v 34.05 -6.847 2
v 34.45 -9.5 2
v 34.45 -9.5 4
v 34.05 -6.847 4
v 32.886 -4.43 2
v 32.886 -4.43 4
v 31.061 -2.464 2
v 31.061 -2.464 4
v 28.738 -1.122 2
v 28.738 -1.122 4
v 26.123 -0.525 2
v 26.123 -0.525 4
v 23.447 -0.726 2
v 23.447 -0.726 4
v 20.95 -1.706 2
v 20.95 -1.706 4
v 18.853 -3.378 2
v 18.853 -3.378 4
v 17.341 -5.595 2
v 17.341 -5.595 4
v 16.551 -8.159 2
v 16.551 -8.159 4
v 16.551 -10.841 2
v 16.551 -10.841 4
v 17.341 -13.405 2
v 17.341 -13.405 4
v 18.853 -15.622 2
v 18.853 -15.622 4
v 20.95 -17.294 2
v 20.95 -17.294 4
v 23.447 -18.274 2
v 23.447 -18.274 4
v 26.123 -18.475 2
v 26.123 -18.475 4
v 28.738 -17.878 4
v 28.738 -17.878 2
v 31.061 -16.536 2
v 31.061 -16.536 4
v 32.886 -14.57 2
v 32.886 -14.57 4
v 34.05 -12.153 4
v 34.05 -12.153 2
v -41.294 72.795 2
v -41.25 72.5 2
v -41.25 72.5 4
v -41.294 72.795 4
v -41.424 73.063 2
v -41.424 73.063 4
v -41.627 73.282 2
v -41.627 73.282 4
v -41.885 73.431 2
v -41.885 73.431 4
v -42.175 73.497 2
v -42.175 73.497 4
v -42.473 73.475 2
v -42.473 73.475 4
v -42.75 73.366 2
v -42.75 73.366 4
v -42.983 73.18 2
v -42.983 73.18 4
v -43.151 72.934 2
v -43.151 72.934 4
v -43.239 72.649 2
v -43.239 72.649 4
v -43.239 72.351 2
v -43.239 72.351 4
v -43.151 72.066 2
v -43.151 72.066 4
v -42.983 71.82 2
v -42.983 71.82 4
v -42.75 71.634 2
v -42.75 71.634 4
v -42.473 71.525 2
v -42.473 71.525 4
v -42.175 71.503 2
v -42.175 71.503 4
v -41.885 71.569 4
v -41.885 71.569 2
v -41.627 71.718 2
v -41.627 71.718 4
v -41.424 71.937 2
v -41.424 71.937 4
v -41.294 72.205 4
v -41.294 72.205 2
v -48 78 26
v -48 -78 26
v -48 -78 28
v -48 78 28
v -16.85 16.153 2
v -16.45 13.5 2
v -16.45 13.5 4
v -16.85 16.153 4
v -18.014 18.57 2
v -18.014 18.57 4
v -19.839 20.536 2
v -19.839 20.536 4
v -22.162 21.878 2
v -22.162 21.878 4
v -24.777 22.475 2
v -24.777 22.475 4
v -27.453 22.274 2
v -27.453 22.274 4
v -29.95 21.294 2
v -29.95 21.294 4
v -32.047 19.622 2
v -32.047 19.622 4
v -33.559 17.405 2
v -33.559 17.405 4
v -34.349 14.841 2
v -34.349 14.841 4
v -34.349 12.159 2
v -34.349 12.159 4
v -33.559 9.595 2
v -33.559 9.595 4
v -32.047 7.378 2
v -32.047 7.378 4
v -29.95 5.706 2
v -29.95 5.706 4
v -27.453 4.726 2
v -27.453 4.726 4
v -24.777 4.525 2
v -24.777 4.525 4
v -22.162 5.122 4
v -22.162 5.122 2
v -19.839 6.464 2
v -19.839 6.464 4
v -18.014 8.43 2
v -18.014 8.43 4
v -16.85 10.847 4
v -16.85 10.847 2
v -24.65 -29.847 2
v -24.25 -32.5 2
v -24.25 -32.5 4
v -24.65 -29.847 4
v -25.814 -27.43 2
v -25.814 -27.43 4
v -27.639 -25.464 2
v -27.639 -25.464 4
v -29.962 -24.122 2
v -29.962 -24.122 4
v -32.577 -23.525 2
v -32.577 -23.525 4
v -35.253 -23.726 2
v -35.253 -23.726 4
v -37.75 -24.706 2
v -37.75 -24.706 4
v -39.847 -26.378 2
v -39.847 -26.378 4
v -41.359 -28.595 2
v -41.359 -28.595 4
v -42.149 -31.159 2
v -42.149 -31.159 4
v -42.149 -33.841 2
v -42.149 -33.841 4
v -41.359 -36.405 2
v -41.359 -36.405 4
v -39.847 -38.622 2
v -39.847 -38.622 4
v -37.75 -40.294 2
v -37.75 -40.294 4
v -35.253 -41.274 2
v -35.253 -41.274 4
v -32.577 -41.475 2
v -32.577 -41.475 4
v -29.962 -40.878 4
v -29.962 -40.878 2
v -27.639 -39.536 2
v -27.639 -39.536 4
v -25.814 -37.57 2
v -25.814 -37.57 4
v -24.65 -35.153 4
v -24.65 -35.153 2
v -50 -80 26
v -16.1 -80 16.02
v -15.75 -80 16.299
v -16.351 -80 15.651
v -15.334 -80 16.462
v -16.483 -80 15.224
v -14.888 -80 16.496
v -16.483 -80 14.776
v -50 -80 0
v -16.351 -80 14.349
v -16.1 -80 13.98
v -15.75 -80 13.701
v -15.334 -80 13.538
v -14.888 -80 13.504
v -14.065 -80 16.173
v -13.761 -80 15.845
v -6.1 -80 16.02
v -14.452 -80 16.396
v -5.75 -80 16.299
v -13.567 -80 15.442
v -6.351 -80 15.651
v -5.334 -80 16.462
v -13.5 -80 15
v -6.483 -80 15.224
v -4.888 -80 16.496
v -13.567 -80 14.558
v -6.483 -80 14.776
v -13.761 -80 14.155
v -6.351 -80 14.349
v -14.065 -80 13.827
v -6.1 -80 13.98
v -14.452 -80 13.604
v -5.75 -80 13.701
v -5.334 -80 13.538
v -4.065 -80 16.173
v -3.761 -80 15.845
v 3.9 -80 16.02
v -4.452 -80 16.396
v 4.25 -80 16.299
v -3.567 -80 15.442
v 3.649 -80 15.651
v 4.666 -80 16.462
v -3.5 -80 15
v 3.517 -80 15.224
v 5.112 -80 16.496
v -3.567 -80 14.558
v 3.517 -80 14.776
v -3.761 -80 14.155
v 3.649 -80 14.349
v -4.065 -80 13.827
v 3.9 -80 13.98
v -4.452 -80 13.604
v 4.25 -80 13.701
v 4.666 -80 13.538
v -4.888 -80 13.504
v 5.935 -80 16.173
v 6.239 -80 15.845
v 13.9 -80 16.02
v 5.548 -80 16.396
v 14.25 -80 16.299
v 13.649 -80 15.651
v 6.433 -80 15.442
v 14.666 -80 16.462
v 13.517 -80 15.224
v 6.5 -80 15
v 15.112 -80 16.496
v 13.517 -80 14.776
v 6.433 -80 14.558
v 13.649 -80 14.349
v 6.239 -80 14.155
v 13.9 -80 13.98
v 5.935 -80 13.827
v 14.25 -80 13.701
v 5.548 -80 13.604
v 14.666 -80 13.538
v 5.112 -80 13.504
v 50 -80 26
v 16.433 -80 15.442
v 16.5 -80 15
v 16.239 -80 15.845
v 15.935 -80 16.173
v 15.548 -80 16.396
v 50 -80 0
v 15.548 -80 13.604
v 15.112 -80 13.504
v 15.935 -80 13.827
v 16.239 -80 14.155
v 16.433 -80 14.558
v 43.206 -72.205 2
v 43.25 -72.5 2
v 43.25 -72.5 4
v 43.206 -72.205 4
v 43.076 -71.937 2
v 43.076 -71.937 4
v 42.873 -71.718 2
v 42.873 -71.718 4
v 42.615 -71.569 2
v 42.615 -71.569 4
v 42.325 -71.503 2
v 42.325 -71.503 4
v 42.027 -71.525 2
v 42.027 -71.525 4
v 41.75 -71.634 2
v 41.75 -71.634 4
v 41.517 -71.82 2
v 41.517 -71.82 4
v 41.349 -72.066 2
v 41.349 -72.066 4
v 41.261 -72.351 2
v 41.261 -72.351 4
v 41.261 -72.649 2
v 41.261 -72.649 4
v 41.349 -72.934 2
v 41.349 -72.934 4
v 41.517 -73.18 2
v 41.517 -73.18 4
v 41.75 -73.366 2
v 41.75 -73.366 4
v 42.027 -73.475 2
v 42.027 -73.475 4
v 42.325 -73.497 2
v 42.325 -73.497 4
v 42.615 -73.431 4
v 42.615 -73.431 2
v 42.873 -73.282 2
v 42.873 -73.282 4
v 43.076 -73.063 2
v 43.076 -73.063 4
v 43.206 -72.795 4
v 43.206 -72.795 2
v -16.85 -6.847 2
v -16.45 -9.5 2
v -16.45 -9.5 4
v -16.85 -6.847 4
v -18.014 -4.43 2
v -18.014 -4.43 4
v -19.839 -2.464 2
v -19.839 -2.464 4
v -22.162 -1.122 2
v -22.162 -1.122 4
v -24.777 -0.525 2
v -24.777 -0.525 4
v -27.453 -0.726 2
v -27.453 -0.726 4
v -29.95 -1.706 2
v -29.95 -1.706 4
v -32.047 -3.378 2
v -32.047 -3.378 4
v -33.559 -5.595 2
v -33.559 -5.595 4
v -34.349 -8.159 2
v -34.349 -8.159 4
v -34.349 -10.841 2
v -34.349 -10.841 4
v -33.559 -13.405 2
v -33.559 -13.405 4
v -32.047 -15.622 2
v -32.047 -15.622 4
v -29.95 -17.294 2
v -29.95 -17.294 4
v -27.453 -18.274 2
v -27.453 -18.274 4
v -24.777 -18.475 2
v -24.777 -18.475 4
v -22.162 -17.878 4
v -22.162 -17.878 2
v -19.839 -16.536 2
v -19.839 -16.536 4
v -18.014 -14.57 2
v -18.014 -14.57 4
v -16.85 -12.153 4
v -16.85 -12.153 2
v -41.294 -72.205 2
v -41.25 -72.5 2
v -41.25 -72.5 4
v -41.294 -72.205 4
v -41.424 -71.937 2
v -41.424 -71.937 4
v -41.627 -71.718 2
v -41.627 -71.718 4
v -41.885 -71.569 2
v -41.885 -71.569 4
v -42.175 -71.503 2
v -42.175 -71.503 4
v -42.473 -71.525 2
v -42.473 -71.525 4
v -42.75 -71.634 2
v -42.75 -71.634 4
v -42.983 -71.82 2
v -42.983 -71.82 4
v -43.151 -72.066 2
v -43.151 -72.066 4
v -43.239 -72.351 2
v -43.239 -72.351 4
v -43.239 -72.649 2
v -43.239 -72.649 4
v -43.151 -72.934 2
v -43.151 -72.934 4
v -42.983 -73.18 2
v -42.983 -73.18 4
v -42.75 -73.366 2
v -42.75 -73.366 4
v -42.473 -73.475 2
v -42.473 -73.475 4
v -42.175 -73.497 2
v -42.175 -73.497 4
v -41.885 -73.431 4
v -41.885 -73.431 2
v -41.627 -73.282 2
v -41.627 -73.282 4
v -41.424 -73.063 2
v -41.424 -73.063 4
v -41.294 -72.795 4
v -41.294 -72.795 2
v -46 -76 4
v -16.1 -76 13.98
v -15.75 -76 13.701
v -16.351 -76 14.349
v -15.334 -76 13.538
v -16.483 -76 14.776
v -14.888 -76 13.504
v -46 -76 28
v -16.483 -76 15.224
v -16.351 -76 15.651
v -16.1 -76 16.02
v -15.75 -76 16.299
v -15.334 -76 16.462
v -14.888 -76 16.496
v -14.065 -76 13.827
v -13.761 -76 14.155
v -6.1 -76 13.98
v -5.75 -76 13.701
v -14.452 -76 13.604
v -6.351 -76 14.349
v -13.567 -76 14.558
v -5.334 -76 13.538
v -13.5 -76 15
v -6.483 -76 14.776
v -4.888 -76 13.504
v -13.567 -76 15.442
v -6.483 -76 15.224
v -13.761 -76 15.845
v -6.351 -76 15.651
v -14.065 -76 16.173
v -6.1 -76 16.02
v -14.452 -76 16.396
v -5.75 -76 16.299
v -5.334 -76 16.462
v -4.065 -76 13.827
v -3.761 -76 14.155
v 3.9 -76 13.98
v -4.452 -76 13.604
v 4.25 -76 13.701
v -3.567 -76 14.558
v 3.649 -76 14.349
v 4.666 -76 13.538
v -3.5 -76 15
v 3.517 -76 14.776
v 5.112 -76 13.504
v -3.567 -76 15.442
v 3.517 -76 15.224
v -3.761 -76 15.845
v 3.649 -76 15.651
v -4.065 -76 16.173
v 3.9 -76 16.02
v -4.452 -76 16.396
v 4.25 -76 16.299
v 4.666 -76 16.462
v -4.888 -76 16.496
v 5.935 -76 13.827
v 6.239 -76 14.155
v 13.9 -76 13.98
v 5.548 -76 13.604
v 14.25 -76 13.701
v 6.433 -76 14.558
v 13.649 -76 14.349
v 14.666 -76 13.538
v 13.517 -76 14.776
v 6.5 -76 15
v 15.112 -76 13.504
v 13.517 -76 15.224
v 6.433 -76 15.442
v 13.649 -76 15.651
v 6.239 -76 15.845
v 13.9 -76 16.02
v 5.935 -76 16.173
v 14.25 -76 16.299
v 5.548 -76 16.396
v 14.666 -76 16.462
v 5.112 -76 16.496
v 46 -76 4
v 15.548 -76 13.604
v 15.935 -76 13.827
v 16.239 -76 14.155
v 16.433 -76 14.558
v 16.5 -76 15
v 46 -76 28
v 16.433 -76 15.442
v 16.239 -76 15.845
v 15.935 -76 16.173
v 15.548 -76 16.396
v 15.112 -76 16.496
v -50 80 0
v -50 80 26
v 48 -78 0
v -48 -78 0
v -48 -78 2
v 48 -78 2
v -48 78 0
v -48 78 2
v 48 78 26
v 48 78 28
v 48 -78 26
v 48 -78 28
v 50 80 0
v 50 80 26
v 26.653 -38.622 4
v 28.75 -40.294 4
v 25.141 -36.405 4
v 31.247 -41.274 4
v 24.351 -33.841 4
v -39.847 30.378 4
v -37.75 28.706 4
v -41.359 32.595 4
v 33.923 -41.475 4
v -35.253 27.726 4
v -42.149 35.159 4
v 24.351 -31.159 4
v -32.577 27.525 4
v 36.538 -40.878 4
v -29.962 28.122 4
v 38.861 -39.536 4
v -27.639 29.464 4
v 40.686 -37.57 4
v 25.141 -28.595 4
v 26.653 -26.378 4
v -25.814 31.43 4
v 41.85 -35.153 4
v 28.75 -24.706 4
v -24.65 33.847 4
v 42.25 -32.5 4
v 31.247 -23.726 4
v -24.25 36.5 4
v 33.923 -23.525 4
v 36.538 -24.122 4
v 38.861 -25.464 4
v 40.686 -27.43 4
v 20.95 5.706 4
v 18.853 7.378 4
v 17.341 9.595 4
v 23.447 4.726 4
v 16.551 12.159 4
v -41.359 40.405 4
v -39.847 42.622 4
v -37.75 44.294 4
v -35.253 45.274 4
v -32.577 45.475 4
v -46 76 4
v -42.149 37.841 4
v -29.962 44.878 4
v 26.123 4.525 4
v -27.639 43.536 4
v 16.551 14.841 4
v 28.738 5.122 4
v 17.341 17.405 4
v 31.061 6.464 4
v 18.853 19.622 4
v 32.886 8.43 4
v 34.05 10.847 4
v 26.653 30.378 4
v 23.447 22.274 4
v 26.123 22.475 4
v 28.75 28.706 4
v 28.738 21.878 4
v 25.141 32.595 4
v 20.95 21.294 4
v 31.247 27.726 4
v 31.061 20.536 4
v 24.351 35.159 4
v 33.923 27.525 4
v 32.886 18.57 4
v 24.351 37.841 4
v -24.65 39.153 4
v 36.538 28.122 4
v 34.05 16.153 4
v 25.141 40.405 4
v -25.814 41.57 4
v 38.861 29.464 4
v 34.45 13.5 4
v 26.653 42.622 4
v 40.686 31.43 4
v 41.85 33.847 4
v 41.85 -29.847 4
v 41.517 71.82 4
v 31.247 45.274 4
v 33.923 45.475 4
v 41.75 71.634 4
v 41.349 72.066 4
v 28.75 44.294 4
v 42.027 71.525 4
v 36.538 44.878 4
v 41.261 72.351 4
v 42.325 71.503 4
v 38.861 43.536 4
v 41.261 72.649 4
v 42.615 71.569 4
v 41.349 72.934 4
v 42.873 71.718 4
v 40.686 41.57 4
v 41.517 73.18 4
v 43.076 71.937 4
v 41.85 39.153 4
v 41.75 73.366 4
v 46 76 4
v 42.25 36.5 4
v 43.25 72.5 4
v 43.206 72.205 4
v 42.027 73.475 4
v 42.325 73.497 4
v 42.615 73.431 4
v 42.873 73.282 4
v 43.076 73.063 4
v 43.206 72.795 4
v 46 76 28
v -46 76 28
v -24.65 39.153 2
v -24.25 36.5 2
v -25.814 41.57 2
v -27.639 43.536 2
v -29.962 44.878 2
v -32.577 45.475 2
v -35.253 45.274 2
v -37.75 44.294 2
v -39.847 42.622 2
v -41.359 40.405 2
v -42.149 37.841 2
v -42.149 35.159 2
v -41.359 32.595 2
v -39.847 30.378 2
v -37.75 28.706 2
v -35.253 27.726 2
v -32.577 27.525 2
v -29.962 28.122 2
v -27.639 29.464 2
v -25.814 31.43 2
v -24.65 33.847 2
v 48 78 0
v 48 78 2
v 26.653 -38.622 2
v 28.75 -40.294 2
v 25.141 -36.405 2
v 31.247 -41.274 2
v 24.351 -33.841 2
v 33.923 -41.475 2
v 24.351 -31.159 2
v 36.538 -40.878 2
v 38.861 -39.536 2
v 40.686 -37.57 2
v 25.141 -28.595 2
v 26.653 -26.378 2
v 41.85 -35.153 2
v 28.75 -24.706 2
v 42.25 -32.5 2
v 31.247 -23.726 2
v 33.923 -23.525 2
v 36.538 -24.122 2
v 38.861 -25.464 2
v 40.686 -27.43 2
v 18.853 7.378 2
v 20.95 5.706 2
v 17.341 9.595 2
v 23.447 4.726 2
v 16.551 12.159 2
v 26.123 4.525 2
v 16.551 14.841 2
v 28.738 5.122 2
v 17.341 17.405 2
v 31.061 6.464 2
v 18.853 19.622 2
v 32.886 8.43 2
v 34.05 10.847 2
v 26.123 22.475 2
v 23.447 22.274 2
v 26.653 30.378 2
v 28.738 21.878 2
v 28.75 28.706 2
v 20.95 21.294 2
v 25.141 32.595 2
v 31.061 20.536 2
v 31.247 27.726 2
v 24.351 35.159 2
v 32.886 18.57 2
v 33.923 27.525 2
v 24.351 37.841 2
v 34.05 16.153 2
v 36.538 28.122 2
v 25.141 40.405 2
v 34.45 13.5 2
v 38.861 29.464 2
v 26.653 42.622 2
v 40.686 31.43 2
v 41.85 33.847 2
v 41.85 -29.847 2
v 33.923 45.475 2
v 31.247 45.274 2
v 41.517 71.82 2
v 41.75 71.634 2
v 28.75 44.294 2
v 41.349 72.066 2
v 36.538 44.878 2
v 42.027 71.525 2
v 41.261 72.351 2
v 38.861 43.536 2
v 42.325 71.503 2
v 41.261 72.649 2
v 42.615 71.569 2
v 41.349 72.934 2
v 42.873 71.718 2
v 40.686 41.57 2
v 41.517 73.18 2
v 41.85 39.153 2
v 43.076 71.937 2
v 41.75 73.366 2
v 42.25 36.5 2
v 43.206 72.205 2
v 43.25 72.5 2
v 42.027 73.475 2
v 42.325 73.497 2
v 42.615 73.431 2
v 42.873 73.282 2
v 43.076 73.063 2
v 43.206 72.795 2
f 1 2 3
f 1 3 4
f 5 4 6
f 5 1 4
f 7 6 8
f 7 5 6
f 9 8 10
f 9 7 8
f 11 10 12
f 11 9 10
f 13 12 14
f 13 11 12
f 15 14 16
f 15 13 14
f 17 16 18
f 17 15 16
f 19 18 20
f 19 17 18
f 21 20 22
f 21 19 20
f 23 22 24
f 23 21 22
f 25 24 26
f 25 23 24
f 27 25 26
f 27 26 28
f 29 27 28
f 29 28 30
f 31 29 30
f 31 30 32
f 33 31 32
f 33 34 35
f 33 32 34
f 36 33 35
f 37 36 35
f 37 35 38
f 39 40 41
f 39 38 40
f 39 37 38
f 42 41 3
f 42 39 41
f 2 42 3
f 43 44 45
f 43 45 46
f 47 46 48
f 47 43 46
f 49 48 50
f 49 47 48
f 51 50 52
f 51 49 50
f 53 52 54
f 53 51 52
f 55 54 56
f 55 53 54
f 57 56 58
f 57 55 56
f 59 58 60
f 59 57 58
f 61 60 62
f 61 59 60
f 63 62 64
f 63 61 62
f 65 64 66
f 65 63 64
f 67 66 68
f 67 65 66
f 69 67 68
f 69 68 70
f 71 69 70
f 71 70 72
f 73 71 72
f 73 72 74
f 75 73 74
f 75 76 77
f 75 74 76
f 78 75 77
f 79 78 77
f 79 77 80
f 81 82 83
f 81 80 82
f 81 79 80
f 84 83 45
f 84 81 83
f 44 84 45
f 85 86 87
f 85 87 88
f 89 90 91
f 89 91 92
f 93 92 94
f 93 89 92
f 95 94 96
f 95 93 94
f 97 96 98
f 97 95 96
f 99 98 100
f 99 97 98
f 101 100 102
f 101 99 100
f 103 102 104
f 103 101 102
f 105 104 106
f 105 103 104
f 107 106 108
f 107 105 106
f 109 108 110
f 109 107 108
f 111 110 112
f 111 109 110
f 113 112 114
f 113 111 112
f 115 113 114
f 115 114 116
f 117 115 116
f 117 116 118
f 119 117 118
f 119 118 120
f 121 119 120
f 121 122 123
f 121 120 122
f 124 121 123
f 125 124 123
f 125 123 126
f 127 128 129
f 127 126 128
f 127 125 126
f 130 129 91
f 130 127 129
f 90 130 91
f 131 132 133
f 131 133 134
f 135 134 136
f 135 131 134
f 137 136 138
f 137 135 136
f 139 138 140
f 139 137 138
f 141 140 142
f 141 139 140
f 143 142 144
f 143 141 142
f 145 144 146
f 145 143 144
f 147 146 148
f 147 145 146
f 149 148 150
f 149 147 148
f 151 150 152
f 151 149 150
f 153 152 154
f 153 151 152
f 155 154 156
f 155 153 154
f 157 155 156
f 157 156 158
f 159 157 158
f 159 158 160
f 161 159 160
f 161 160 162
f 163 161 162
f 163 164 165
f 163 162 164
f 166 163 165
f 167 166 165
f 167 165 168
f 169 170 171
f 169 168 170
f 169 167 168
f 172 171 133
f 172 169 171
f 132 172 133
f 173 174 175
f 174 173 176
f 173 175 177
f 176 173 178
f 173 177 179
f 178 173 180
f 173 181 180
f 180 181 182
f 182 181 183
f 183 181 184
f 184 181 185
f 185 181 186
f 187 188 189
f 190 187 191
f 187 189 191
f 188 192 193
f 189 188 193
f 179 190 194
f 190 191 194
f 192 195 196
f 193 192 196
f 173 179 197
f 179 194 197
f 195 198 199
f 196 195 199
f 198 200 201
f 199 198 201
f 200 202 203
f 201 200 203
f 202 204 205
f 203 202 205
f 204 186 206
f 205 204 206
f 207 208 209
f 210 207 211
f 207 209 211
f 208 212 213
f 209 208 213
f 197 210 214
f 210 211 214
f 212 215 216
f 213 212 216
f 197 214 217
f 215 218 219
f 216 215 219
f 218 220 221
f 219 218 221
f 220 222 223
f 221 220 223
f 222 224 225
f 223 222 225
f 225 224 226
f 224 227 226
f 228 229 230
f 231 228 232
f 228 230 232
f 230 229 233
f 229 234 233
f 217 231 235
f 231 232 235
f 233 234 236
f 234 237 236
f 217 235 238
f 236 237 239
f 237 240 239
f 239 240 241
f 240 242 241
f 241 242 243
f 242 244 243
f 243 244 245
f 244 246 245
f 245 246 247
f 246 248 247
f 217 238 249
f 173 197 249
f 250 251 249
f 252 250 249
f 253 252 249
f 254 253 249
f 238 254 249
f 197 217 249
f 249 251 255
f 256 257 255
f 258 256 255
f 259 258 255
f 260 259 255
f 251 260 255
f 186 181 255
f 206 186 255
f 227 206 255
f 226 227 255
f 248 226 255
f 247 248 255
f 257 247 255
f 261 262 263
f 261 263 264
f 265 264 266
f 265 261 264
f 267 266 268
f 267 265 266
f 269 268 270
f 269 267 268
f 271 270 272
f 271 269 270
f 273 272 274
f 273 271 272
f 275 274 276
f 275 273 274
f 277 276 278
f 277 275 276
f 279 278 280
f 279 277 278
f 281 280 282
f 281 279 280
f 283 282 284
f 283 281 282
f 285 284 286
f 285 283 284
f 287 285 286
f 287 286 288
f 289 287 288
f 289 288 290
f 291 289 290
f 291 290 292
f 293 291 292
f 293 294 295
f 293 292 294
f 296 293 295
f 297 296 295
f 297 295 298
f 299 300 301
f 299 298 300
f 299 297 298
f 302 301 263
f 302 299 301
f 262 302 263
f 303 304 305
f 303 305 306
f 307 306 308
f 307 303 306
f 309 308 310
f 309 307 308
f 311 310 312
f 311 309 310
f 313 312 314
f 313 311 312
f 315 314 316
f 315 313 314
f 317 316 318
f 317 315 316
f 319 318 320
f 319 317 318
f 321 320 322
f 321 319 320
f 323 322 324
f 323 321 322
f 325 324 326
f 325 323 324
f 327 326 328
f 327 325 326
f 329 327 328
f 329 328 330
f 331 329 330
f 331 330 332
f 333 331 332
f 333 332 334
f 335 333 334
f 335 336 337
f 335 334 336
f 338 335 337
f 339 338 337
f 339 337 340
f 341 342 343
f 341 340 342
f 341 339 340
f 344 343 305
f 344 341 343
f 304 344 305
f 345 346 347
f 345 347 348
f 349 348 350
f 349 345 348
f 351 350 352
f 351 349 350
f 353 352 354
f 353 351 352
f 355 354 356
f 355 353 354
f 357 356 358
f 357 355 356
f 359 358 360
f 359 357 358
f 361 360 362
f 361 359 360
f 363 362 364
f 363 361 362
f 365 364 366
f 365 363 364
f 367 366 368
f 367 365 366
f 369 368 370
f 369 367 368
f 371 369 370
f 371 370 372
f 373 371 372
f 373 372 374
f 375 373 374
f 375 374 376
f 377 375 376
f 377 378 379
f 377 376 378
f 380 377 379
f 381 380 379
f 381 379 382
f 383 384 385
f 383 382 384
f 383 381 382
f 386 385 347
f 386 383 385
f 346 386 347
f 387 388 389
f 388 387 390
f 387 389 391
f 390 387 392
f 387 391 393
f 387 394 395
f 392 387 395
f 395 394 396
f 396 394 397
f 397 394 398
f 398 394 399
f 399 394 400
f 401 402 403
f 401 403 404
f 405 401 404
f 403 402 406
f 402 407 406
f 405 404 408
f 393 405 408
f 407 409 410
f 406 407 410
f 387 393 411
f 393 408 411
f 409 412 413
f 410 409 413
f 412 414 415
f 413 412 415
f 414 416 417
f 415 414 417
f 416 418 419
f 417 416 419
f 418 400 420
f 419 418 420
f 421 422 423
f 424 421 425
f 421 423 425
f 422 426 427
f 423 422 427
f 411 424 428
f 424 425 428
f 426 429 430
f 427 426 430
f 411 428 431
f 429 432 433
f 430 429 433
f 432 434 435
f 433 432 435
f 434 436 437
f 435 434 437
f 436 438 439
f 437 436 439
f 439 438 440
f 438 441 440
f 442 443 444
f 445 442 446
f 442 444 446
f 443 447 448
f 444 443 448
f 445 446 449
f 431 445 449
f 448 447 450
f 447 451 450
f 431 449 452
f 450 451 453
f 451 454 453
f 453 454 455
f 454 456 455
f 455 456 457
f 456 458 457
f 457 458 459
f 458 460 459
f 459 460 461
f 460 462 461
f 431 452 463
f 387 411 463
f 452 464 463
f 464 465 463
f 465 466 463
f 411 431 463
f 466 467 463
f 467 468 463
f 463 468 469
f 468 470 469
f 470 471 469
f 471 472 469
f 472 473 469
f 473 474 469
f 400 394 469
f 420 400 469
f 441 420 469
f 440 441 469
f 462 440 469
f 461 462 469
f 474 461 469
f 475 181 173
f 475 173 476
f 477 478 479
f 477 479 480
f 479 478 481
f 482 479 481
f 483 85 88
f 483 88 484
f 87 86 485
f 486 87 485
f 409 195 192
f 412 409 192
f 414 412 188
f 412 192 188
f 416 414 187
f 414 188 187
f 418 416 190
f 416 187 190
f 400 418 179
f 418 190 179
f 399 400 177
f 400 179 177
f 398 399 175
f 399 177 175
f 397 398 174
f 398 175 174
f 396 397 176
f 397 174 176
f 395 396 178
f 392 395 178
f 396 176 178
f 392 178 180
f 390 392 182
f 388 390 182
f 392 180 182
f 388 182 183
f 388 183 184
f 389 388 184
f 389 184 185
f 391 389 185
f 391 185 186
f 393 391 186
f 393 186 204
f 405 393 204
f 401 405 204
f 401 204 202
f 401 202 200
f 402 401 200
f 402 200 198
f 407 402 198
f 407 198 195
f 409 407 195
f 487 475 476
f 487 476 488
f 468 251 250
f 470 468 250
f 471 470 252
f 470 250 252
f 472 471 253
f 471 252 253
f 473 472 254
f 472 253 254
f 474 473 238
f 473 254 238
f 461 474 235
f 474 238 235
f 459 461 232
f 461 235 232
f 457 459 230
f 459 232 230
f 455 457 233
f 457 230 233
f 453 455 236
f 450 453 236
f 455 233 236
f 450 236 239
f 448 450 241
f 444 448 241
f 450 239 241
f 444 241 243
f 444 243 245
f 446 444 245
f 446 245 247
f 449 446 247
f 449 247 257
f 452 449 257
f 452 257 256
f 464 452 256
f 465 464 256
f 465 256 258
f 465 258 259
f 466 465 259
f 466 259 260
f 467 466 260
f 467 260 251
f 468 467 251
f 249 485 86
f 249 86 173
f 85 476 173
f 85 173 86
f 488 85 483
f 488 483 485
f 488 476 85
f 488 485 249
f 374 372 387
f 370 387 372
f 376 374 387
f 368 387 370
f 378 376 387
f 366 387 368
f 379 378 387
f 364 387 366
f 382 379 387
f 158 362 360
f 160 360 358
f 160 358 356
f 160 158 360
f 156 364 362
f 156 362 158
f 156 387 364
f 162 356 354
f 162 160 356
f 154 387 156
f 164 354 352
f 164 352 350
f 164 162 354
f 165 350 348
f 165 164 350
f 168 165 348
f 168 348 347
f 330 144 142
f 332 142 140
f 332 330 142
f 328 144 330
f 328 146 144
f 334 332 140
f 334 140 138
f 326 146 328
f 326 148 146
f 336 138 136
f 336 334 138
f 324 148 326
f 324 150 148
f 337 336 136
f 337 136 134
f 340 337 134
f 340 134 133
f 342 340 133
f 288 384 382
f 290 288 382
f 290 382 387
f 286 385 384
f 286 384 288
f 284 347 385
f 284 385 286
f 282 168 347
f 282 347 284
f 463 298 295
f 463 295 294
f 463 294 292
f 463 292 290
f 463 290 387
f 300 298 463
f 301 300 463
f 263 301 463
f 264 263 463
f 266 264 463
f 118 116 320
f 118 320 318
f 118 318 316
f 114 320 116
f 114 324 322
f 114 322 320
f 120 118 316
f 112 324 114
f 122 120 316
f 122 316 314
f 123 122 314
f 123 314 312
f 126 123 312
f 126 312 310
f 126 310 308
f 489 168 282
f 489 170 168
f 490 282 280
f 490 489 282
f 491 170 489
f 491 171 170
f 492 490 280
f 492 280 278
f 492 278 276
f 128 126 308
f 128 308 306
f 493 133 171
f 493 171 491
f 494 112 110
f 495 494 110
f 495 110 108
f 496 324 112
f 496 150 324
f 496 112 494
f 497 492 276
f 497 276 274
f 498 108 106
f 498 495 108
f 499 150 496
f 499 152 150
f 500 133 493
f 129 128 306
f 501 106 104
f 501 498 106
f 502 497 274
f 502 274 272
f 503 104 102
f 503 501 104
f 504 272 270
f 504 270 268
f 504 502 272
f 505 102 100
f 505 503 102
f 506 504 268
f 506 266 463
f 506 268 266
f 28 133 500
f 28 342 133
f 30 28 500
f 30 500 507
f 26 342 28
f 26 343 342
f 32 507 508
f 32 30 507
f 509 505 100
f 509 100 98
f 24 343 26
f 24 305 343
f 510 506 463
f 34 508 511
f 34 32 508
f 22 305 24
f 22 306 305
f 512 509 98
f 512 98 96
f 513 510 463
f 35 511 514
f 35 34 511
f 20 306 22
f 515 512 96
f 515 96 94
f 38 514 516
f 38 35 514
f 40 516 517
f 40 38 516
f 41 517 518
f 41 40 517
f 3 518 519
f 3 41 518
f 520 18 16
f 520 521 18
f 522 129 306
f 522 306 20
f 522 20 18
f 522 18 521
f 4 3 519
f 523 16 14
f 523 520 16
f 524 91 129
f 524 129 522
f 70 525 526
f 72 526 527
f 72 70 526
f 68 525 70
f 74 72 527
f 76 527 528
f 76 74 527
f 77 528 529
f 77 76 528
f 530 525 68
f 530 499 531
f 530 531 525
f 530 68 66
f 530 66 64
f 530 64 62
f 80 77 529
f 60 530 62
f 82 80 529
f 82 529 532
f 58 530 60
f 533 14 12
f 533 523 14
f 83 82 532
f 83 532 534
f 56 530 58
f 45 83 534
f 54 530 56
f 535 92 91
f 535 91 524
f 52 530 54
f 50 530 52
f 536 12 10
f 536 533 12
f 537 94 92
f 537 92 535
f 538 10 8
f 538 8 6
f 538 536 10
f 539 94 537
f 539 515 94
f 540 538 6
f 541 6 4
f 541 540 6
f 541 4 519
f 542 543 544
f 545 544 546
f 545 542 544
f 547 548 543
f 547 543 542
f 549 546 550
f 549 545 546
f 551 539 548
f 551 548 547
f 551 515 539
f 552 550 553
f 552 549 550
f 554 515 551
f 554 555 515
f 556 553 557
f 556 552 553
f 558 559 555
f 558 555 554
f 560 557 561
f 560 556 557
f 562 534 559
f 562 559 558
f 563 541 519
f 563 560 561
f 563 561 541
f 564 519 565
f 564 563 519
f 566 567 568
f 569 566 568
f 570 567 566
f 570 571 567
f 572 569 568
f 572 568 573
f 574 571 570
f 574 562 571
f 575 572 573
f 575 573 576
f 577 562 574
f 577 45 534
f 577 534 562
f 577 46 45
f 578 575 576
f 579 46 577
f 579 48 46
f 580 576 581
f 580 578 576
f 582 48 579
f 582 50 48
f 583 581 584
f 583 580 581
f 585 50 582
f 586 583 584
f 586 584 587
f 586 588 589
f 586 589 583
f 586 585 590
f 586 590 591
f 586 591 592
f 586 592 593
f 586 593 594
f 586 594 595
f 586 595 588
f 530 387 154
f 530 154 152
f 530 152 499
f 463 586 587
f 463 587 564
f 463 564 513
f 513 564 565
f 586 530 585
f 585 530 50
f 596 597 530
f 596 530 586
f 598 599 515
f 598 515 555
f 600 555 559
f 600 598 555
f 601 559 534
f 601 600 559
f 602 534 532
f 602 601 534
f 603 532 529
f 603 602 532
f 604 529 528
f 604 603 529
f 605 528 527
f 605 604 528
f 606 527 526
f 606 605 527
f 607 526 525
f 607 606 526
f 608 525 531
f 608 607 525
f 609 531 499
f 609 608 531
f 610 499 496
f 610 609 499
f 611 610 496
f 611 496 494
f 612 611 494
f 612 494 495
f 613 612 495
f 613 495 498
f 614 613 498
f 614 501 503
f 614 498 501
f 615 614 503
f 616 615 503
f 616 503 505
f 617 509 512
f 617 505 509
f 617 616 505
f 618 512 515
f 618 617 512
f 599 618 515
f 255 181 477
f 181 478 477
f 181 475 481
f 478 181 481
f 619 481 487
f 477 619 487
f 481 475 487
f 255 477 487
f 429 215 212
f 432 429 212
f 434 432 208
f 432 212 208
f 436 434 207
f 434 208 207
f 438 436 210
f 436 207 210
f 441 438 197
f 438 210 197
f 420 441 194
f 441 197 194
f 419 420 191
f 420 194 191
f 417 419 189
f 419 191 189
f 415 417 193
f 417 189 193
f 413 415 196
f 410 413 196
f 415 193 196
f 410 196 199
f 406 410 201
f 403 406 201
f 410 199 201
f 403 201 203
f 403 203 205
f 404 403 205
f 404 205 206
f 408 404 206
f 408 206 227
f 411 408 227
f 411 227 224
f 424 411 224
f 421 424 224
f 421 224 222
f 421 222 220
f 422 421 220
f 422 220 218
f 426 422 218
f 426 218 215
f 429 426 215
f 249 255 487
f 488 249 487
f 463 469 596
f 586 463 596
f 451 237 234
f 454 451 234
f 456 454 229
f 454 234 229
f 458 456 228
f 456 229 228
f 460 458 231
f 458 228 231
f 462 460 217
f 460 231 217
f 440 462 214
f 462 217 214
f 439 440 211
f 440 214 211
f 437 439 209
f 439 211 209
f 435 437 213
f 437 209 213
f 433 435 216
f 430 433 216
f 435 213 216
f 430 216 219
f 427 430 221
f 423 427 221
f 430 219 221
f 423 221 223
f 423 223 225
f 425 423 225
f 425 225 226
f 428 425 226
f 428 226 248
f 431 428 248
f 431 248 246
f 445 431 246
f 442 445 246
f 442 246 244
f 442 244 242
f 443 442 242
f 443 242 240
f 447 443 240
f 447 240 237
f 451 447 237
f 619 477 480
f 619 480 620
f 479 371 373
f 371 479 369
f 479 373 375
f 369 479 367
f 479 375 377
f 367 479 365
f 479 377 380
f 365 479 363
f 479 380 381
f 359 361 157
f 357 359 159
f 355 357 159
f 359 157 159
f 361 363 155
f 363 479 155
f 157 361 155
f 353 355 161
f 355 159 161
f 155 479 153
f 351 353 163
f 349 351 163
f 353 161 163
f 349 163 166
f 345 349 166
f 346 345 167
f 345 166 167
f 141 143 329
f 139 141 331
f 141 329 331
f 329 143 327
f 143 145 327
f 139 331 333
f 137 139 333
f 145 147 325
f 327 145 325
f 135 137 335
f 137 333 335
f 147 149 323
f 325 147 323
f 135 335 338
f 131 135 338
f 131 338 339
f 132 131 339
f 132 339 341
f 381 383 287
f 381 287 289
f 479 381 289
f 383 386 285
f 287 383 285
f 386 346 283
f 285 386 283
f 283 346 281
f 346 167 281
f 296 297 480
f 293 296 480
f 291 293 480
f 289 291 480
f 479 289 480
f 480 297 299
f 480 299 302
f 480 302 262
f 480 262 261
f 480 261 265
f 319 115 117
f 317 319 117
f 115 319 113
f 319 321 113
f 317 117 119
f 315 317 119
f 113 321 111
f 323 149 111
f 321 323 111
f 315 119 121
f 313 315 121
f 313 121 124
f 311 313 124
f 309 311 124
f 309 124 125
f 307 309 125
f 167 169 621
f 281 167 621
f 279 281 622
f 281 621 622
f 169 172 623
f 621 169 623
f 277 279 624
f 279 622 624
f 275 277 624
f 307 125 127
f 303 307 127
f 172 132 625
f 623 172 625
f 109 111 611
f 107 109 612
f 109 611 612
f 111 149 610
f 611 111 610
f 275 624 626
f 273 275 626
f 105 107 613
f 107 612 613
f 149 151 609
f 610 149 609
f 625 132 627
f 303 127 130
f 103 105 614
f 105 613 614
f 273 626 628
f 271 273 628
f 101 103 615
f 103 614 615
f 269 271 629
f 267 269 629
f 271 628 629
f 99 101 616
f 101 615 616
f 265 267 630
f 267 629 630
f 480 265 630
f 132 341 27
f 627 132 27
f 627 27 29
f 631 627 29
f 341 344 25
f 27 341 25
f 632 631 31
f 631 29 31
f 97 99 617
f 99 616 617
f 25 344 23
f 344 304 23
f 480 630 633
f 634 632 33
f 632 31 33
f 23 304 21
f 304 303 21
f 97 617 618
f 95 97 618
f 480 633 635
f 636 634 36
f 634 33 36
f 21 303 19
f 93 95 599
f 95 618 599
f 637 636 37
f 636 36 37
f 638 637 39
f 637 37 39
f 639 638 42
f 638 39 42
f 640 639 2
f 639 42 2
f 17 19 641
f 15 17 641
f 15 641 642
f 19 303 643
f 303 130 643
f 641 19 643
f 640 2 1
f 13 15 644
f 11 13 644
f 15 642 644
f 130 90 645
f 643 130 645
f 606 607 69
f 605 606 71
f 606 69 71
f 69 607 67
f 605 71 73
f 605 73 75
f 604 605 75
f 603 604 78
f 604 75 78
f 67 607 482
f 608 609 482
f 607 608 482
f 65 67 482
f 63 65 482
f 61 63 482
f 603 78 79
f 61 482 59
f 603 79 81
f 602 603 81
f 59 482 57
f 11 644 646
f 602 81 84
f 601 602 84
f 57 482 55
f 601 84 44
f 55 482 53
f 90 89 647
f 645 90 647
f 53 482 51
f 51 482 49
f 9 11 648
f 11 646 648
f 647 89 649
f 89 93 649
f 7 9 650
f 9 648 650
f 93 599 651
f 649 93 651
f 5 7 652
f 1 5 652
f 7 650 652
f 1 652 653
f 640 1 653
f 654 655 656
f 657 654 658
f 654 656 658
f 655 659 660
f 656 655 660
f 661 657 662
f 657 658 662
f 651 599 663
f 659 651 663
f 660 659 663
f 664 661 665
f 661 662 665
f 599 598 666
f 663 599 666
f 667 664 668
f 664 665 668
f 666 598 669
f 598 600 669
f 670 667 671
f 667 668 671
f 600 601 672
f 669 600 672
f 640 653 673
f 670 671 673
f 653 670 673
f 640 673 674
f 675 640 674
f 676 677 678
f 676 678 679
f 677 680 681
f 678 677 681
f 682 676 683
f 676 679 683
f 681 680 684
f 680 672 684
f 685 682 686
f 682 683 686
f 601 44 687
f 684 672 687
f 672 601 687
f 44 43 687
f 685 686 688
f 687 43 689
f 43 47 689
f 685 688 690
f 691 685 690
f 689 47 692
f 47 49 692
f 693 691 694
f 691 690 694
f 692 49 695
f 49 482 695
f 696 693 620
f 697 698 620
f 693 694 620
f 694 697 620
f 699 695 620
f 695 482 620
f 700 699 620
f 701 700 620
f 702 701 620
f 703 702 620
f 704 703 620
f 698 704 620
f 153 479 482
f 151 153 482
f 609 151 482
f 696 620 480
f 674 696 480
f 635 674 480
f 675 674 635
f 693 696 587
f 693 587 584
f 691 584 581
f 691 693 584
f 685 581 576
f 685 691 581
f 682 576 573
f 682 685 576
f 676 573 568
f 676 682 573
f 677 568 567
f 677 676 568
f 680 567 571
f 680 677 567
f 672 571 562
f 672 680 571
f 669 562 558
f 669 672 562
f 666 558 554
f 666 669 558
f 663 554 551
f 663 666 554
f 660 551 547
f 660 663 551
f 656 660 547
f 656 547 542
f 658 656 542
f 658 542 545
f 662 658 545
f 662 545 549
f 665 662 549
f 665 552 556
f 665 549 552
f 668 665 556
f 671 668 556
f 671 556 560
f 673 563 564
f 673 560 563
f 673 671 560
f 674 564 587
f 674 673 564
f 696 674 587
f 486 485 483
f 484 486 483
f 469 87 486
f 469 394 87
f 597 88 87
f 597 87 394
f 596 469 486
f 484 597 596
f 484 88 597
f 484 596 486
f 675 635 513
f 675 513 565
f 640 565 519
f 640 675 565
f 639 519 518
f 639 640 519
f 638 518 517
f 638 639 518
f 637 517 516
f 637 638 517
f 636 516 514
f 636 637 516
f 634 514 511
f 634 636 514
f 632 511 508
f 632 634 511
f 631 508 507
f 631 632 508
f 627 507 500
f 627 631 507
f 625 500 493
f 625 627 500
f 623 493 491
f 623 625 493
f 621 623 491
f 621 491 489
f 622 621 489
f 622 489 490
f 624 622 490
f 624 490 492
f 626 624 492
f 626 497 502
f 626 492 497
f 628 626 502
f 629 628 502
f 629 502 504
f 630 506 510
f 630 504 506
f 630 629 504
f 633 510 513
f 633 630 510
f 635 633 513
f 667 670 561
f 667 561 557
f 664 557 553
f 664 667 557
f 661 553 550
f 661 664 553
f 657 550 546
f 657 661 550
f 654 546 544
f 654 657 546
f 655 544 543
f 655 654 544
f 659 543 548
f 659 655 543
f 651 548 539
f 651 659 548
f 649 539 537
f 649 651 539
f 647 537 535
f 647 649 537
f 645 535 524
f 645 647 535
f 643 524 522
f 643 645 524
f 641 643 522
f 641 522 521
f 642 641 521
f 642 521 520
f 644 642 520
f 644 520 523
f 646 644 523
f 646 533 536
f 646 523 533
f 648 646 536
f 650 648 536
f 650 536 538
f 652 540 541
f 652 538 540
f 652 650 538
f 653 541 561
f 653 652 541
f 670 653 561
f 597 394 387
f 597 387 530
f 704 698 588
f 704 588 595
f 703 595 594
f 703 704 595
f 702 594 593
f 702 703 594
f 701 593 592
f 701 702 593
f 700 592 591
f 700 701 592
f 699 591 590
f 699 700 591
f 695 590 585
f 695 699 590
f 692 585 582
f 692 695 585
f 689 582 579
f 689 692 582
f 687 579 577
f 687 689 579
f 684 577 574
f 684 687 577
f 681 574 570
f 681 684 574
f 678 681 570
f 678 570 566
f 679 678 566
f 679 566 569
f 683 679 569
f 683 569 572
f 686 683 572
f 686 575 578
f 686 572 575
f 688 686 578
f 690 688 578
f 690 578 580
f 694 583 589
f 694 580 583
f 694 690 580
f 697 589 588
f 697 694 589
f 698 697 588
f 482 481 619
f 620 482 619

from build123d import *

# Parameters (mm, degrees)
SKETCH_W        = 100
SKETCH_H        = 160
PAD_DEPTH       = 26
SKETCH001_W     = 96
SKETCH001_H     = 156
PAD001_DEPTH    = 28
SKETCH005_W     = 92
SKETCH005_H     = 152
POCKET_DEPTH    = 24
SKETCH003_R     = 9
POCKET001_DEPTH = 28.001
SKETCH002_R     = 1
POCKET002_DEPTH = 28.001
SKETCH006_W     = 96
SKETCH006_H     = 156
POCKET003_DEPTH = 2
SKETCH007_R     = 1.5
POCKET004_DEPTH = 10


with BuildPart() as part:
    # Sketch → Pad (new body)
    with BuildSketch(Plane.XY):
        Rectangle(SKETCH_W, SKETCH_H)
    extrude(amount=PAD_DEPTH)

    # Sketch001 → Pad001 (join)
    with BuildSketch(Plane.XY):
        Rectangle(SKETCH001_W, SKETCH001_H)
    extrude(amount=PAD001_DEPTH)

    # Sketch005 → Pocket (cut)
    with BuildSketch(Plane.XY.offset(28)):
        Rectangle(SKETCH005_W, SKETCH005_H)
    extrude(amount=-POCKET_DEPTH, mode=Mode.SUBTRACT)

    # Sketch003 → Pocket001 (cut, through all)
    with BuildSketch(Plane.XY):
        with Locations((33.25, 36.5)):
            Circle(SKETCH003_R)
        with Locations((25.45, 13.5)):
            Circle(SKETCH003_R)
        with Locations((25.45, -9.5)):
            Circle(SKETCH003_R)
        with Locations((33.25, -32.5)):
            Circle(SKETCH003_R)
        with Locations((-33.25, 36.5)):
            Circle(SKETCH003_R)
        with Locations((-25.45, 13.5)):
            Circle(SKETCH003_R)
        with Locations((-25.45, -9.5)):
            Circle(SKETCH003_R)
        with Locations((-33.25, -32.5)):
            Circle(SKETCH003_R)
    extrude(amount=POCKET001_DEPTH, mode=Mode.SUBTRACT)

    # Sketch002 → Pocket002 (cut, through all)
    with BuildSketch(Plane.XY):
        with Locations((42.25, 72.5)):
            Circle(SKETCH002_R)
        with Locations((-42.25, 72.5)):
            Circle(SKETCH002_R)
        with Locations((42.25, -72.5)):
            Circle(SKETCH002_R)
        with Locations((-42.25, -72.5)):
            Circle(SKETCH002_R)
    extrude(amount=POCKET002_DEPTH, mode=Mode.SUBTRACT)

    # Sketch006 → Pocket003 (cut)
    with BuildSketch(Plane.XY):
        Rectangle(SKETCH006_W, SKETCH006_H)
    extrude(amount=POCKET003_DEPTH, mode=Mode.SUBTRACT)

    # Sketch007 → Pocket004 (cut)
    with BuildSketch(Plane.XZ.offset(80)):
        with Locations((-15, 15)):
            Circle(SKETCH007_R)
        with Locations((-5, 15)):
            Circle(SKETCH007_R)
        with Locations((5, 15)):
            Circle(SKETCH007_R)
        with Locations((15, 15)):
            Circle(SKETCH007_R)
    extrude(amount=-POCKET004_DEPTH, mode=Mode.SUBTRACT)


solid = part.part
